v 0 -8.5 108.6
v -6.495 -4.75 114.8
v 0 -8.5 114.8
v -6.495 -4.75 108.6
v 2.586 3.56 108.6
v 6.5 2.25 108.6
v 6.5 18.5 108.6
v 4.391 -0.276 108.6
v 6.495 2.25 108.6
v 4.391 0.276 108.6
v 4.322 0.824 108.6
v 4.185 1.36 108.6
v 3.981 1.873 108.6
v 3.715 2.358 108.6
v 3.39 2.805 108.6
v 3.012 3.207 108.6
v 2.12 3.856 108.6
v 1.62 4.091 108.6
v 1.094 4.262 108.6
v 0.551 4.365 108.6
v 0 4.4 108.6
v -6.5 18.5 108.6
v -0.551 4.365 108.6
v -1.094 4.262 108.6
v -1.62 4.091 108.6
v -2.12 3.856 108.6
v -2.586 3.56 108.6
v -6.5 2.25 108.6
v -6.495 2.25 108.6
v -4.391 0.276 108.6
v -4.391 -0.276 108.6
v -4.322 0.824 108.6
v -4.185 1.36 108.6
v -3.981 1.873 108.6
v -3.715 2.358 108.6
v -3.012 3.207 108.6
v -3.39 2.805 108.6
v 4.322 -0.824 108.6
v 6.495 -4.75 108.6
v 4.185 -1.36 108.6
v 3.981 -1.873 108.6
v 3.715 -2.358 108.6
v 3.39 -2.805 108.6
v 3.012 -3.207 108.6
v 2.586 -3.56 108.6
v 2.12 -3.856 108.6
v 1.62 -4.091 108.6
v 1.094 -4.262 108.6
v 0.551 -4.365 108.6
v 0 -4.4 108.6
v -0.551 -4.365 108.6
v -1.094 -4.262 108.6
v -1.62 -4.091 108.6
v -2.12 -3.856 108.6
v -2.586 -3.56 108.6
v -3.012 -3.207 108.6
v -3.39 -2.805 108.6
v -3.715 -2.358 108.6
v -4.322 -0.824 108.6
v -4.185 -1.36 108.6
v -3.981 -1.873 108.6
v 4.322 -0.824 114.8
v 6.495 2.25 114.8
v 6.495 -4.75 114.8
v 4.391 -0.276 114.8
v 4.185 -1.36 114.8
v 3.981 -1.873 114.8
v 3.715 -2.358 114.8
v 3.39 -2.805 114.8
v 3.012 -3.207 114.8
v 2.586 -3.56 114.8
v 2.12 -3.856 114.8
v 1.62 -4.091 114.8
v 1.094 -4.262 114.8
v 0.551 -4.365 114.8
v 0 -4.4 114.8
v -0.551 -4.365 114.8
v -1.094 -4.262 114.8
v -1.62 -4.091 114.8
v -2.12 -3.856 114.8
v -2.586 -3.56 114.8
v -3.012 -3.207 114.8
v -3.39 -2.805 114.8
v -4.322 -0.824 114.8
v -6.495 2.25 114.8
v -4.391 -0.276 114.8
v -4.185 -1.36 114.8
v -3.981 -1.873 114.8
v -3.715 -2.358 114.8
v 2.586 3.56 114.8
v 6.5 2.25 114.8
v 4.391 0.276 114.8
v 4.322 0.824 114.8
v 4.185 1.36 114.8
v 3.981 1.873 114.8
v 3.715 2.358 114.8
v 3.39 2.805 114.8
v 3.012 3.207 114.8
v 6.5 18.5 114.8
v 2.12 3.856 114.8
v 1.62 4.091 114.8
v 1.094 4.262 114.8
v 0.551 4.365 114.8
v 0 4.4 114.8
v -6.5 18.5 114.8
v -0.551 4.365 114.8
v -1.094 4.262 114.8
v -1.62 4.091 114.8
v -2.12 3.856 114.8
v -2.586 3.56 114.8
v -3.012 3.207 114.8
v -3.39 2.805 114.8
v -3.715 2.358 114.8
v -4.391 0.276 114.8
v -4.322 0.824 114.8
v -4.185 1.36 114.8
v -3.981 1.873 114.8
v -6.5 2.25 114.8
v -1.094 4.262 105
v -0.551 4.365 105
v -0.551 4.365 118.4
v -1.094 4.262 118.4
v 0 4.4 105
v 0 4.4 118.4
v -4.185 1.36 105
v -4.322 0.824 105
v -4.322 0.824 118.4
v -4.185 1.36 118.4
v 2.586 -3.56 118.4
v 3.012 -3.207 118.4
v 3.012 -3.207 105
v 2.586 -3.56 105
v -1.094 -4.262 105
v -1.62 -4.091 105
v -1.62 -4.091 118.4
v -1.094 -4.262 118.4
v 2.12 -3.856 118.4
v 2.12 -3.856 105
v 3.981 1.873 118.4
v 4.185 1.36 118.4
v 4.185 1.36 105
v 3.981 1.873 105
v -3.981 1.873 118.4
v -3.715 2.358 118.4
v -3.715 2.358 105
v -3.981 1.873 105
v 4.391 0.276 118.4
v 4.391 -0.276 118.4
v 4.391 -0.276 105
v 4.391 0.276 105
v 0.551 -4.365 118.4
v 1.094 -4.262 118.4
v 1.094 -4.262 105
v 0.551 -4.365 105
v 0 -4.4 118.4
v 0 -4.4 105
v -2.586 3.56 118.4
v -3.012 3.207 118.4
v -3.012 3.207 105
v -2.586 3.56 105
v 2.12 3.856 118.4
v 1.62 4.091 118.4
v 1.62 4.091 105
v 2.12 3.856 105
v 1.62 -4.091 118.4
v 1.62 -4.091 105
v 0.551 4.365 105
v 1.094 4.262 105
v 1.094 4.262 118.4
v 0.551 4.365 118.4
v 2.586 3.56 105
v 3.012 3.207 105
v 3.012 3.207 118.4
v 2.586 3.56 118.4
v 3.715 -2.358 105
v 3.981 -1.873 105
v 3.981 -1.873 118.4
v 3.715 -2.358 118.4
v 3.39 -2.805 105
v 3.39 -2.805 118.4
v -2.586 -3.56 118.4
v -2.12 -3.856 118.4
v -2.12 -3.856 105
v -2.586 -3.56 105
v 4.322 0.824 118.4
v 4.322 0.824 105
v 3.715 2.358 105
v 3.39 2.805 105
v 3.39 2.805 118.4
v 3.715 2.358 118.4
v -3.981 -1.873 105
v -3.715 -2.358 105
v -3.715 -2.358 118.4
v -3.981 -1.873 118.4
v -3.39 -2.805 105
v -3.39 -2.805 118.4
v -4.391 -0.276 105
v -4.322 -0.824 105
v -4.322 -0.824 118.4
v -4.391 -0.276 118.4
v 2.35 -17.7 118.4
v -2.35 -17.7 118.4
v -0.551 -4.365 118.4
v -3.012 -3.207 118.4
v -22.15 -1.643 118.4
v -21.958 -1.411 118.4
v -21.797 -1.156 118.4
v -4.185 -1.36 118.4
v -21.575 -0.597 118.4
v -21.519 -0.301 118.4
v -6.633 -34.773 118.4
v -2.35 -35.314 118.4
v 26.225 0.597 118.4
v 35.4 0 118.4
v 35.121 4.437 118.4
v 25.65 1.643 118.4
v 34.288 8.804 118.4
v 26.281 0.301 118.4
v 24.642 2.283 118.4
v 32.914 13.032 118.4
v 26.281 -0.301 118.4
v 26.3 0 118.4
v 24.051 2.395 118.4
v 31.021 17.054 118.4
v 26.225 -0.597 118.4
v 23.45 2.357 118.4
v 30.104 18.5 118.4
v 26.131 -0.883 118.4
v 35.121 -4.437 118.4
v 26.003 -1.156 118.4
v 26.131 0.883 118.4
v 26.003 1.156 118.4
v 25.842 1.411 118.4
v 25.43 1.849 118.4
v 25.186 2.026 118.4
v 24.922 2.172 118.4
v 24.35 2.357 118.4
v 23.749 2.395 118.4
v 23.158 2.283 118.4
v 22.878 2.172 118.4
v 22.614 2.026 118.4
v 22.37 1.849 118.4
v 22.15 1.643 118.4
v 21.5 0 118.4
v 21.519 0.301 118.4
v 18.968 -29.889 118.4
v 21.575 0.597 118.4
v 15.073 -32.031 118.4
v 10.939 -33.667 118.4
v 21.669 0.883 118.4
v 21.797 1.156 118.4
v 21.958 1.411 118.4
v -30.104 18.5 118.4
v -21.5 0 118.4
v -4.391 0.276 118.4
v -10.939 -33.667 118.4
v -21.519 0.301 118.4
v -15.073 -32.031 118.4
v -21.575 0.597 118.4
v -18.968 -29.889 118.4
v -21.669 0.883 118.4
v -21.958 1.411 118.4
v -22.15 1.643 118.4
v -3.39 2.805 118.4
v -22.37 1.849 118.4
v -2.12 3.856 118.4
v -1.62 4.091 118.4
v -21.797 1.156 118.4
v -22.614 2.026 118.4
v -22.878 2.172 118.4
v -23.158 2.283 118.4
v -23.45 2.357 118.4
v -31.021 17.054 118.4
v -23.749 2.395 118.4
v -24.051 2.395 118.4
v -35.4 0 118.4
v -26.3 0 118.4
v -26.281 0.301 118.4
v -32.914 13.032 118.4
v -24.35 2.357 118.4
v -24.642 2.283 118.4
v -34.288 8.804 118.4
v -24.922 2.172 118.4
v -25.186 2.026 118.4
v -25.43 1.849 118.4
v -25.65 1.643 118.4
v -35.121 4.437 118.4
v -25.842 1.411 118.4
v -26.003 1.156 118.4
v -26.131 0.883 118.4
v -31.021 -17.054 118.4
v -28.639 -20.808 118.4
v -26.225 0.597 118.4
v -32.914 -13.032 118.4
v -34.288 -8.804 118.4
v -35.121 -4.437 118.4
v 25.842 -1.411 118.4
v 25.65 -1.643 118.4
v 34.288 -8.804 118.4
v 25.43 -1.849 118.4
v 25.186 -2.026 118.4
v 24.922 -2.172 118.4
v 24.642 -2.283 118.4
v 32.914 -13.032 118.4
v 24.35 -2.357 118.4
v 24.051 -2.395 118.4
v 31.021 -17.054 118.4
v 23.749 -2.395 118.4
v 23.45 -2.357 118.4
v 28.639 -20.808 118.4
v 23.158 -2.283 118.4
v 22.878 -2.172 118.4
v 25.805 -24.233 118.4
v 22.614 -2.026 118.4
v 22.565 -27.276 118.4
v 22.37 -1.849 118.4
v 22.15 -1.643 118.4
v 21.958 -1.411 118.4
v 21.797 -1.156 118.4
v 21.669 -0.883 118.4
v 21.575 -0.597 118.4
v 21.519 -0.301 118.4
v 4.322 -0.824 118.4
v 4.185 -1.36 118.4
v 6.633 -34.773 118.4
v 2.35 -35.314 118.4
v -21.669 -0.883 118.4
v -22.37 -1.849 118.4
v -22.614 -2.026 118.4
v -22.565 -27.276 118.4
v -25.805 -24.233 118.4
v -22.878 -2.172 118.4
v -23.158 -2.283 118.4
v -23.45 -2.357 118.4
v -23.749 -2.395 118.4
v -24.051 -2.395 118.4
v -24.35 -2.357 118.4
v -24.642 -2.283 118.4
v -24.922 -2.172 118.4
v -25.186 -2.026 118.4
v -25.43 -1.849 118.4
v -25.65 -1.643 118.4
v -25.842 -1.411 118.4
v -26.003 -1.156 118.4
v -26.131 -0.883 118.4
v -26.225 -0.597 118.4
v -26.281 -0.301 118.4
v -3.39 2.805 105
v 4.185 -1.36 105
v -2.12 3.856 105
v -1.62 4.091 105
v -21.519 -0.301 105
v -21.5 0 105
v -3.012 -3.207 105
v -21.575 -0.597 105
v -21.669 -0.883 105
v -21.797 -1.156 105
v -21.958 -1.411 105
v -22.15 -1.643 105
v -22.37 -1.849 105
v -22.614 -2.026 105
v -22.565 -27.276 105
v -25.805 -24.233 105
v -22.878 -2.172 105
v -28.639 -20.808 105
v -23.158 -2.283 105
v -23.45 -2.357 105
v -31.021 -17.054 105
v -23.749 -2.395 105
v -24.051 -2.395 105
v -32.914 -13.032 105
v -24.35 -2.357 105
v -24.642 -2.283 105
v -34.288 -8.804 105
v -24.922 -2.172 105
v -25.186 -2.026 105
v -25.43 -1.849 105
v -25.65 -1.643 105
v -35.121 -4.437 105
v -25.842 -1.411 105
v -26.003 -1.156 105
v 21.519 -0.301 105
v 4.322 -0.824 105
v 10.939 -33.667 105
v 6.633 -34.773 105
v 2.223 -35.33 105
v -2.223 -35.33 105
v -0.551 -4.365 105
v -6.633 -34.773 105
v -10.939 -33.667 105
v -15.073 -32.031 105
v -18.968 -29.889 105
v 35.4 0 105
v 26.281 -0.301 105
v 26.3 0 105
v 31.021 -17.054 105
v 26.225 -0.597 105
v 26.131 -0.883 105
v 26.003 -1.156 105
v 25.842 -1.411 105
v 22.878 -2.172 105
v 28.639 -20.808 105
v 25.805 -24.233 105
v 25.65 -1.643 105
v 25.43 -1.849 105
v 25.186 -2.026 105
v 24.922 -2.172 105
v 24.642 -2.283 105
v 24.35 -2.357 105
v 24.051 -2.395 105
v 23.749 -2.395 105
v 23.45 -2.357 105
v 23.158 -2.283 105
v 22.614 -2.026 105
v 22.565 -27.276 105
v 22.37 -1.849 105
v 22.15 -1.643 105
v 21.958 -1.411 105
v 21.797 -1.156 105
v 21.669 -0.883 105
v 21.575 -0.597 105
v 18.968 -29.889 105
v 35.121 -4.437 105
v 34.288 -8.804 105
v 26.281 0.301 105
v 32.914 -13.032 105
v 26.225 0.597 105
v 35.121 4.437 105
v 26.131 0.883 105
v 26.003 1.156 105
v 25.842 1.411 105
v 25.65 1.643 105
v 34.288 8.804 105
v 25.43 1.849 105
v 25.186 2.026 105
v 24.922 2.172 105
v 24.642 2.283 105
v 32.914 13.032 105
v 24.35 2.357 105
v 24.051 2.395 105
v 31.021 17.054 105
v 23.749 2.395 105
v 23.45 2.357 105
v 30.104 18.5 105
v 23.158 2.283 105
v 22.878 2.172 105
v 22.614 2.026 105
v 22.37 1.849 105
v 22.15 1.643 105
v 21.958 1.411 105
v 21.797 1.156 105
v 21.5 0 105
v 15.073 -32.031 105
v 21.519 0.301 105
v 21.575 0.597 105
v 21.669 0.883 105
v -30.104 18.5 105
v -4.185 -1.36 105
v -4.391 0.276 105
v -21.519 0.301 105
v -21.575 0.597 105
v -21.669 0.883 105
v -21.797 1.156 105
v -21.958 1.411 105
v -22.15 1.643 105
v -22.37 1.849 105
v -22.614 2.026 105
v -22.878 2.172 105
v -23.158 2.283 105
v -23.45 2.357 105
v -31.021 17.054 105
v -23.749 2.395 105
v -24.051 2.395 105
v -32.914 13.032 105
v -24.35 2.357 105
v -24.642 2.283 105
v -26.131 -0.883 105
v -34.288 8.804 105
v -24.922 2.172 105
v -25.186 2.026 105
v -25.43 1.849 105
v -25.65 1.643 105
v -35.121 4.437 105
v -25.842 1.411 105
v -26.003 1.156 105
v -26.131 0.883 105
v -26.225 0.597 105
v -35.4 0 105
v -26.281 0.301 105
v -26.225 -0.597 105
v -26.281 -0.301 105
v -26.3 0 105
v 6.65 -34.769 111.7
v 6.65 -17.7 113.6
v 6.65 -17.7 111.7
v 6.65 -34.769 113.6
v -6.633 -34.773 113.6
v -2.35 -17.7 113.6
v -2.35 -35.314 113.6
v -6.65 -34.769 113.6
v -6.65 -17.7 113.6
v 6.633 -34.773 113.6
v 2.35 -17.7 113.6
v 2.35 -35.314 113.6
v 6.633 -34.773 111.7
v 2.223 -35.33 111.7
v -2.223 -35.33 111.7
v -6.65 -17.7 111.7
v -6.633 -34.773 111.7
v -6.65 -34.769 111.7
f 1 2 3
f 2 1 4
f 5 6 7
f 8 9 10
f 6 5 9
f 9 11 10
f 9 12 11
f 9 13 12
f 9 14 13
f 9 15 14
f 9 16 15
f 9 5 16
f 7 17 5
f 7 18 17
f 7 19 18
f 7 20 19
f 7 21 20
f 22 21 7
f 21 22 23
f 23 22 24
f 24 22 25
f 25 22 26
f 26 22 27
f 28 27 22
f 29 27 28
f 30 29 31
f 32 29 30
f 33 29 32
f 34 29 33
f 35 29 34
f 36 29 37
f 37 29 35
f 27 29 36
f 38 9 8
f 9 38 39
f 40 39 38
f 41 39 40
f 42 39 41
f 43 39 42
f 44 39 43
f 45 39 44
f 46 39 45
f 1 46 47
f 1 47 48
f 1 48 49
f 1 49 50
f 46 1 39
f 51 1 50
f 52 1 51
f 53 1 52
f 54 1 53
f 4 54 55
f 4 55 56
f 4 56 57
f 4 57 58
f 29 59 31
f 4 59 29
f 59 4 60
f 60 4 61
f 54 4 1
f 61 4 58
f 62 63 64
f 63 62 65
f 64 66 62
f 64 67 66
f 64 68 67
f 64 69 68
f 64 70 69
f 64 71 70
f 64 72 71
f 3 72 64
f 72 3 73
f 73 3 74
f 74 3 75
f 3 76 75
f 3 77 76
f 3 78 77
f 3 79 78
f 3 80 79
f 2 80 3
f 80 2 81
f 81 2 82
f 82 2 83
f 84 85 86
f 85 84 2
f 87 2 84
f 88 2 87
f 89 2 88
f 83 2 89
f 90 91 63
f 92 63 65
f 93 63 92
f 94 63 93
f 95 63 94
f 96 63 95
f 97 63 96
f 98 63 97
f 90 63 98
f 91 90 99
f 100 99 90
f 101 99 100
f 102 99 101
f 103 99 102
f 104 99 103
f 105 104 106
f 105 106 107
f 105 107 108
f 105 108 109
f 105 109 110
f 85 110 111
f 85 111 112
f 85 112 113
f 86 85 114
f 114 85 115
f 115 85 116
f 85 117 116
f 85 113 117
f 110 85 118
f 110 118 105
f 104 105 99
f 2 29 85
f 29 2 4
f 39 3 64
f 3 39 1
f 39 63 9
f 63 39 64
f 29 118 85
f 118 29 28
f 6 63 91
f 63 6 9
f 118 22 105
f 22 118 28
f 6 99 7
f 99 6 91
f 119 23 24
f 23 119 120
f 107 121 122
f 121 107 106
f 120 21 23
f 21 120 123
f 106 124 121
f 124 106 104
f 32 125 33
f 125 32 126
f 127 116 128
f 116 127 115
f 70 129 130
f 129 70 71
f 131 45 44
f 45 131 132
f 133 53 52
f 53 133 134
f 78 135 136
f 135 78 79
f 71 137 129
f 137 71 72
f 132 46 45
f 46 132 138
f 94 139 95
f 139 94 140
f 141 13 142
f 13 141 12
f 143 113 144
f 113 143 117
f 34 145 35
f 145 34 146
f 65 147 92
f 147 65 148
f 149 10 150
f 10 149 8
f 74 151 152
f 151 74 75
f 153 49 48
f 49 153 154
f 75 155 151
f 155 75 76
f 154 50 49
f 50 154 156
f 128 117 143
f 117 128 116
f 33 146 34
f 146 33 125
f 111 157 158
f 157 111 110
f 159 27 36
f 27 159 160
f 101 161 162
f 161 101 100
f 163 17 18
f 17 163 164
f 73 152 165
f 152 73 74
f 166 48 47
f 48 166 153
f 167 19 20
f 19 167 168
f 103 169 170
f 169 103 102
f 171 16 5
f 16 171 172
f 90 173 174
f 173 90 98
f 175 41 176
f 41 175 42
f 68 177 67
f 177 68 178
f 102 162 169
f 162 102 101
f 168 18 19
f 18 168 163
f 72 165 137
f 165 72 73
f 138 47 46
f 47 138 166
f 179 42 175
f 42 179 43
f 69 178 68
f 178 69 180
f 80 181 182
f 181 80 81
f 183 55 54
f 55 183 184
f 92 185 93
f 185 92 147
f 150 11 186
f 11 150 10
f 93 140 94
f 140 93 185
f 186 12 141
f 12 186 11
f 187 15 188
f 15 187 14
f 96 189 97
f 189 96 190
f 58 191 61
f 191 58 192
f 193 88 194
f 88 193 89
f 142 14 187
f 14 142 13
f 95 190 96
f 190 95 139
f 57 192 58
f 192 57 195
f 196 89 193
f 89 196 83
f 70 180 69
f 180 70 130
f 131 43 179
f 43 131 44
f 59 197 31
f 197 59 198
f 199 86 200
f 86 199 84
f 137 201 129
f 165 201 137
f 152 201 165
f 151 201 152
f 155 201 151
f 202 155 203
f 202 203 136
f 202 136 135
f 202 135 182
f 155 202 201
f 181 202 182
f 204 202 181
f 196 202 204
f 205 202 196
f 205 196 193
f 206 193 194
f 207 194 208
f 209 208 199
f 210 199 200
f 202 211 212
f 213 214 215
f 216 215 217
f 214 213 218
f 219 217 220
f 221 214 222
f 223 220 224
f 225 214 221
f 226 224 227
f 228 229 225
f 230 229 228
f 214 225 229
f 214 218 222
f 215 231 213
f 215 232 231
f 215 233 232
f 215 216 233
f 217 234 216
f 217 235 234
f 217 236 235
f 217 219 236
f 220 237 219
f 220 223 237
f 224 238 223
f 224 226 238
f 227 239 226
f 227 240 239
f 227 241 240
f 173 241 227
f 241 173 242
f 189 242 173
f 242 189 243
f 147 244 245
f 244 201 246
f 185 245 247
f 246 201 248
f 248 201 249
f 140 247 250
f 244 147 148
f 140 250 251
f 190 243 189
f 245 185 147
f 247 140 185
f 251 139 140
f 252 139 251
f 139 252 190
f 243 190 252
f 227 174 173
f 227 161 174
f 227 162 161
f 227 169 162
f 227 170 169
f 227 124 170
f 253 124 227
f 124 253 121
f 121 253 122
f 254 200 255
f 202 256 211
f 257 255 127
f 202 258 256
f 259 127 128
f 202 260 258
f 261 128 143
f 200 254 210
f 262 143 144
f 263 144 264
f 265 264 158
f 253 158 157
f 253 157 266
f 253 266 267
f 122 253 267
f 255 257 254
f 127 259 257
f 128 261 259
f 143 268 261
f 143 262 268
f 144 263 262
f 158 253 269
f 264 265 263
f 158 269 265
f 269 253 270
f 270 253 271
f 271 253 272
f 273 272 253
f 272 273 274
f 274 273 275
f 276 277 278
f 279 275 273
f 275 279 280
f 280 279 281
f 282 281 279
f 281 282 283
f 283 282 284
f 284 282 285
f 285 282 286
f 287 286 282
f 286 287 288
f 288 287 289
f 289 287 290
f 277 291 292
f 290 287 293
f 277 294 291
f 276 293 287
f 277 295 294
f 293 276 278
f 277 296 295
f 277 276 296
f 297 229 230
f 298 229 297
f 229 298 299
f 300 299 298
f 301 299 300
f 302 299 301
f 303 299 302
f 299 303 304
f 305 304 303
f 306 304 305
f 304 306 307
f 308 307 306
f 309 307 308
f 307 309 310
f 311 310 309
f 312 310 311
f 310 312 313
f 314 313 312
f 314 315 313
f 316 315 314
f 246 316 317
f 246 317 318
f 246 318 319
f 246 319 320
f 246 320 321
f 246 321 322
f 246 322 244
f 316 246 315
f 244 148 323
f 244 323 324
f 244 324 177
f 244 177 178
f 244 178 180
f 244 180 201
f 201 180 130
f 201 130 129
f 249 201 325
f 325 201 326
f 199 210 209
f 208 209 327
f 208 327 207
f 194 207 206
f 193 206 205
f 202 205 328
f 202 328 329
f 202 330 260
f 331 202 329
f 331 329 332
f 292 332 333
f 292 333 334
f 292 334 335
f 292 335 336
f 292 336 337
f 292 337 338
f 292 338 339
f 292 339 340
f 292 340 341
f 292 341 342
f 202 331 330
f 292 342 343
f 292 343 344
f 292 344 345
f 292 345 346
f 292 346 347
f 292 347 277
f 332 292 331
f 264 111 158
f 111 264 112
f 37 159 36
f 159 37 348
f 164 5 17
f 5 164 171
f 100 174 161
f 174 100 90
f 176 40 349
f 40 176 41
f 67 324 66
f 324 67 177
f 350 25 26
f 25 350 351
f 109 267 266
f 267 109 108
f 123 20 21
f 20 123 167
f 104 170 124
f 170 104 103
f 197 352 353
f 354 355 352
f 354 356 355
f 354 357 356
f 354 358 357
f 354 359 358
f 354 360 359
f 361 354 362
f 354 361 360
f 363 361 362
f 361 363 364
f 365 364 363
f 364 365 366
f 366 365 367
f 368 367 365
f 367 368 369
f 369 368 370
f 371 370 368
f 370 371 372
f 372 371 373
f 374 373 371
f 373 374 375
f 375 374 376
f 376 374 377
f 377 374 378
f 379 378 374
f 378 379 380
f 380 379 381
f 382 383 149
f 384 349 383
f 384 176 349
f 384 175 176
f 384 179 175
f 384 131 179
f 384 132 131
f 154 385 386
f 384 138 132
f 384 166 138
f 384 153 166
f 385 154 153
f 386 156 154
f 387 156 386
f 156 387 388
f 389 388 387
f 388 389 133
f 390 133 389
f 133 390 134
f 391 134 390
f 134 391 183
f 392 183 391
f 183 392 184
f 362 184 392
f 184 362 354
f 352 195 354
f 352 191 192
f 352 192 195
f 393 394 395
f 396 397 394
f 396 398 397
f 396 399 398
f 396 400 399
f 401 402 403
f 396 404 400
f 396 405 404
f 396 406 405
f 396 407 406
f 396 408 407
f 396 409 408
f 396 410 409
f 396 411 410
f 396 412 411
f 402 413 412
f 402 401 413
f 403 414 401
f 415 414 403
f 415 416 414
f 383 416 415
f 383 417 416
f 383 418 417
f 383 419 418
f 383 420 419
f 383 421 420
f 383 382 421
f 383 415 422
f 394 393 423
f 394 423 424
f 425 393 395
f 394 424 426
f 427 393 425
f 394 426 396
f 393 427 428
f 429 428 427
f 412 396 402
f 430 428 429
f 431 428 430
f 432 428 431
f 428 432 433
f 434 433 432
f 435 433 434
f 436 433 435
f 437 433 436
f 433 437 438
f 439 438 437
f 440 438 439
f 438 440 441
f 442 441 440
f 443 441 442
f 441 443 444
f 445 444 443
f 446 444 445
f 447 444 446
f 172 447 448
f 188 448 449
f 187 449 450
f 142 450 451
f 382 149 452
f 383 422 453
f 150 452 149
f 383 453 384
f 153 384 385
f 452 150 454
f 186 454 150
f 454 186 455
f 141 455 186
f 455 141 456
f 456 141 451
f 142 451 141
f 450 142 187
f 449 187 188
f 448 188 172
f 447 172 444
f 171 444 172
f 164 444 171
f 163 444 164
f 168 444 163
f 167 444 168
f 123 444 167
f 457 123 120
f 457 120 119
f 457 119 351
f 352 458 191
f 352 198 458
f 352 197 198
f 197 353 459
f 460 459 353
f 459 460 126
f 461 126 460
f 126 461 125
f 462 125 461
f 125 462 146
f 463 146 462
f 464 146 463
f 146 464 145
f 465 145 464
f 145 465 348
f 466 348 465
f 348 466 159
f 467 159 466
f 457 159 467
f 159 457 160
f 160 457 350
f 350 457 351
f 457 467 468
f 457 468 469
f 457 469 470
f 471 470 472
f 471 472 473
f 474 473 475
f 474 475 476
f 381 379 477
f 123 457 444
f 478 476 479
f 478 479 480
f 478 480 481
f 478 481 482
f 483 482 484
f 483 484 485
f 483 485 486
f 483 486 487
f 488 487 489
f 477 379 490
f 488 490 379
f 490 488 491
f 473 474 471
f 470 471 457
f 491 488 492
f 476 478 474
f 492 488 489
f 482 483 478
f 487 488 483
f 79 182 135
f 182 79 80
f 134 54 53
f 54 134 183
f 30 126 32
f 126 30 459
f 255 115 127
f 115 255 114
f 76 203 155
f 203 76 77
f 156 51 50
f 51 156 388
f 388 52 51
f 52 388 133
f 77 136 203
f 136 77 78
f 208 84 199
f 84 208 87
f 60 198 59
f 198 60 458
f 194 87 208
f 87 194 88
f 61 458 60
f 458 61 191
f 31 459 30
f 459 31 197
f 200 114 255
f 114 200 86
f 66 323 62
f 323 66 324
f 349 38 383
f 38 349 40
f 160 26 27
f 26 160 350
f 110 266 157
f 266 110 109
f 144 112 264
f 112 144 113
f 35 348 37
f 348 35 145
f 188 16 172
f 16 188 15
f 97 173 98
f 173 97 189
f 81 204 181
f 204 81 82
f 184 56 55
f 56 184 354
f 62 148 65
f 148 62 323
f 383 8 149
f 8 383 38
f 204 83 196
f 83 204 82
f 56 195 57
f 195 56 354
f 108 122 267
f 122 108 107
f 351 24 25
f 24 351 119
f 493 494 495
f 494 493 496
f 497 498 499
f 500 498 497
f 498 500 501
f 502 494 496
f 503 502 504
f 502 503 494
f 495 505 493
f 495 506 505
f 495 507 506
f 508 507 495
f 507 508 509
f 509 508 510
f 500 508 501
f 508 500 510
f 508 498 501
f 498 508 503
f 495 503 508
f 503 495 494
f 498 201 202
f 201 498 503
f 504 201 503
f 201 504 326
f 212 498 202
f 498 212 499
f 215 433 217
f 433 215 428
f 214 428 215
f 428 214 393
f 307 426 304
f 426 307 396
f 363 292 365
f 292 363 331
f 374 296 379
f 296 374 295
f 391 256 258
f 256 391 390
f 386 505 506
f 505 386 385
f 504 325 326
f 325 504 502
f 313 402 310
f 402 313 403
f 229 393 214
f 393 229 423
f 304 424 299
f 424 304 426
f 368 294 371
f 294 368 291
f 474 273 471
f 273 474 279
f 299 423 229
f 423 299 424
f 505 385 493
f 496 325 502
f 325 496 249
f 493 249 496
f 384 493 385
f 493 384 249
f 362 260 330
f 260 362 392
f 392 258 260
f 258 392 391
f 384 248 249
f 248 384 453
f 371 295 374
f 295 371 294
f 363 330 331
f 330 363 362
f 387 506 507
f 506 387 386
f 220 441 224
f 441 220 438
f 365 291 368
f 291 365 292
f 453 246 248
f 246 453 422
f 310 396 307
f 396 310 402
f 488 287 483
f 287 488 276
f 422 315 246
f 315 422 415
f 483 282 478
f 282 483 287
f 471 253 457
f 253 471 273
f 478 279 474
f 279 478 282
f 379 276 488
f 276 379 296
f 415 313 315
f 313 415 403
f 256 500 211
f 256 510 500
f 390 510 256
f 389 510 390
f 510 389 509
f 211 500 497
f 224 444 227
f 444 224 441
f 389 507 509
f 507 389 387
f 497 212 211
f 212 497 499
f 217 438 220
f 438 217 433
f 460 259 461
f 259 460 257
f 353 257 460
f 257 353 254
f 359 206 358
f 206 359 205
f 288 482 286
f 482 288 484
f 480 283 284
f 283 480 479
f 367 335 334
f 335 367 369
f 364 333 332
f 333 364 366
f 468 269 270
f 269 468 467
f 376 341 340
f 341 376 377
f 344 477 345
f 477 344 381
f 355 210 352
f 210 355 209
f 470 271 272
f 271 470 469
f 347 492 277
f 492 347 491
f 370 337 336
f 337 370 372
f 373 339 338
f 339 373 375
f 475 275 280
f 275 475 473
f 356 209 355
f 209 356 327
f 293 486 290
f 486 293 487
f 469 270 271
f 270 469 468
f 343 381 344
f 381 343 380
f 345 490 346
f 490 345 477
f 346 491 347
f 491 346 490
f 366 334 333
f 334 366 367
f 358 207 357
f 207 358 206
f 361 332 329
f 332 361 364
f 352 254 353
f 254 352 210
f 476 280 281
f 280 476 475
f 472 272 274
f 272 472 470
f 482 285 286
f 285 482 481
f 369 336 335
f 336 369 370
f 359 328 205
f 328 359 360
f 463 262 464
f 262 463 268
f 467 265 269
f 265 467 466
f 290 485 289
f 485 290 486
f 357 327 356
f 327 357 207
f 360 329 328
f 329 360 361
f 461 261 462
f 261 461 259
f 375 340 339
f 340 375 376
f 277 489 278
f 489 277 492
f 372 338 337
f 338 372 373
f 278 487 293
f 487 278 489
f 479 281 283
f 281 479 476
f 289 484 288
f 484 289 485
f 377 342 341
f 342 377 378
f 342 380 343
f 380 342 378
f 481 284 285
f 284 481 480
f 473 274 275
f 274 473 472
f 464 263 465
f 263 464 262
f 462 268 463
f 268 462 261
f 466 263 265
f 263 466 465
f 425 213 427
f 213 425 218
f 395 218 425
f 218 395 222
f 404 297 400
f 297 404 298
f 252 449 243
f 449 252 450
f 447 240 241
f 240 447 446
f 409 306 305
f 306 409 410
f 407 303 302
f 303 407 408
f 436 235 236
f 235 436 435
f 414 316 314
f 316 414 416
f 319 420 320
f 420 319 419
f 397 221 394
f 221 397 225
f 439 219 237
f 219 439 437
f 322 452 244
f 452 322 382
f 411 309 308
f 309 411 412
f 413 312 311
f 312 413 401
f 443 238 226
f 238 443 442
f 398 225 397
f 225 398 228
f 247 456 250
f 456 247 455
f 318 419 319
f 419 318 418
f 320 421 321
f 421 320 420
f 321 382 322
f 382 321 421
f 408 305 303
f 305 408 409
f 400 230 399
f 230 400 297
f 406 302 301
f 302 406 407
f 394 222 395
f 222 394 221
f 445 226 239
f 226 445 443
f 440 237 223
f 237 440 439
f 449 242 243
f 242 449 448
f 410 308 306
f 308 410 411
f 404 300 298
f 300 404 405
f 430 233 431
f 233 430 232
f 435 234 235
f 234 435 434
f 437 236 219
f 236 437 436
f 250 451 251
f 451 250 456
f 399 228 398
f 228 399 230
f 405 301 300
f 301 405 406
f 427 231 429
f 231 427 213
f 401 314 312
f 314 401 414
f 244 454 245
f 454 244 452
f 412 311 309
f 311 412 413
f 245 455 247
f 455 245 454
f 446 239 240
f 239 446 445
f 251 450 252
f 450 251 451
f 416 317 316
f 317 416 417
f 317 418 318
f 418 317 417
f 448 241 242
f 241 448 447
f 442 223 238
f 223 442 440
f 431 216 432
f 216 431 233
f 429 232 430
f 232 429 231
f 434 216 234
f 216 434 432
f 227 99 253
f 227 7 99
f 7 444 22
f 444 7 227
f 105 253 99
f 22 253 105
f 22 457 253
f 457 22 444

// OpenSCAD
$fn=50;

//syringe
syringe_front_radius= 14.8;
syringe_front_length = 6.3;

syringe_rear_length = 5.4;
syringe_rear_radius = 14.4;

//from middle part
syringe_middle_length = 105;
syringe_middle_radius = 11.5;

shaft_length = 10;
shaft_radius = 2.1;


nut_lenght = 6.2;
nut_side_to_side = 13;

berring_radius = 7.5;
spacing = 2;

rod_distance = berring_radius+spacing+syringe_rear_radius;
extruder_middle_radius = syringe_rear_radius + berring_radius*2 + spacing*6/2;
extruder_middle_length = syringe_rear_length+ spacing*4;

//axis shaft
threaded_rod_radius = 4.4;
syringe_nozzle_length = 20;
syringe_nozzle_radius = 2.5;

//motor ho
motor_holder_length = 5;
//motor
motor_s_radius = 11.5;
motor_s_length = 2;
motor_shaft_radius = 2.6;
motor_screw_radius = 1.5;
from_motor_center_to_screw = 15;

add_a_little_space = 0.3;

//where to press on syringe
syringe_piston_top_radius = 12.7/2+ add_a_little_space;
syringe_piston_top_length = 1.6 +add_a_little_space;

syringe_piston_rod_length = 100; //no need to be exact
syringe_piston_rod_radius = 4.1/2+add_a_little_space;

module circle_extrude(length, radius){
    linear_extrude(length){
        circle(r = radius);
    }
}
module front_part(){
    //Front part
    difference(){
        linear_extrude(extruder_middle_length){
            circle(r = extruder_middle_radius);
        }
        // shaft1
        translate([-rod_distance,0,0]){
            circle_extrude(shaft_length,shaft_radius);
        }

        // shaft2
        translate([rod_distance,0,0]){
            circle_extrude(shaft_length,shaft_radius);
        }
           
        //syringe_front
        translate([0,-(syringe_front_radius+spacing+threaded_rod_radius), (shaft_length-syringe_front_length)/2]){
            circle_extrude(syringe_front_length, syringe_front_radius);
            translate([-syringe_front_radius,-syringe_front_radius*15,0]){
                cube([syringe_front_radius*2,syringe_front_radius*15,syringe_front_length]);
            }
            rotate([180,0,0]){
                //nozzle
                translate([0,0,-0.1]){
                circle_extrude(syringe_nozzle_length+0.2, syringe_nozzle_radius);    
                
                //cuts to insert nozzle
                translate([-syringe_nozzle_radius,0,0]){
                    cube([syringe_nozzle_radius*2,syringe_nozzle_radius*15,syringe_nozzle_length]);
                }
                }
            }
            //syringe body
            circle_extrude(syringe_middle_length, syringe_middle_radius);  
            translate([-syringe_middle_radius,-syringe_middle_radius*15,0]){  
                cube([syringe_middle_radius*2,syringe_middle_radius*15,syringe_middle_length]);
            }
        }
        
        //threaded_rod
        circle_extrude(shaft_length, threaded_rod_radius);
        
        //cut in bottom
         translate([-extruder_middle_radius,berring_radius+spacing,0]){
                cube([extruder_middle_radius*2,extruder_middle_radius*2,extruder_middle_length]);
            }
    }
}

module moror_part()
{
    //motor coupling part
    translate([0,0,200]){
        difference(){
            linear_extrude(motor_holder_length){
                circle(r = extruder_middle_radius);
            }    
            // shaft1
            translate([-rod_distance,0,0]){
                circle_extrude(shaft_length,shaft_radius);
            }

            // shaft2
            translate([rod_distance,0,0]){
                circle_extrude(shaft_length,shaft_radius);
            }
            //motor 
            circle_extrude(motor_s_length, motor_s_radius);
            circle_extrude(shaft_length, motor_shaft_radius);
            
            //motor holder
            translate([from_motor_center_to_screw, from_motor_center_to_screw, 0]){
                circle_extrude(shaft_length, motor_screw_radius);
            }
            translate([-from_motor_center_to_screw,from_motor_center_to_screw,0]){
                circle_extrude(shaft_length, motor_screw_radius);
            }
            translate([-from_motor_center_to_screw,-from_motor_center_to_screw,0]){
                circle_extrude(shaft_length, motor_screw_radius);
            }
             translate([from_motor_center_to_screw,-from_motor_center_to_screw,0]){
                circle_extrude(shaft_length, motor_screw_radius);
            }        
            
            //cut in bottom
            translate([-extruder_middle_radius,from_motor_center_to_screw+motor_screw_radius+spacing,0]){
                cube([extruder_middle_radius*2,extruder_middle_radius*2,extruder_middle_length]);
            }
        }
    }
}


module syringe()
{
    //front
    circle_extrude(syringe_front_length, syringe_front_radius);
    //middle
    circle_extrude(syringe_middle_length, syringe_middle_radius);
    //rear
    translate([0,0,syringe_middle_length-syringe_rear_length]){
        circle_extrude(syringe_rear_length, syringe_rear_radius);
    }        
}
module extruder_middle(){
    
    //part itself
    difference(){
        linear_extrude(extruder_middle_length){
            circle(r = extruder_middle_radius);
        }
        
        // shaft1
        translate([-rod_distance, 0, 0]){
            circle_extrude(extruder_middle_length,shaft_radius + add_a_little_space);
        }

        // shaft2
        translate([rod_distance, 0, 0]){
            circle_extrude(extruder_middle_length, shaft_radius + add_a_little_space);
        }
        
       //hex cut
        rotate([0,0,90]){
            translate([-1,0,(extruder_middle_length-nut_lenght)/2]){
                linear_extrude(nut_lenght){
                    circle(d=15, $fn=6);             
                }
                translate([nut_side_to_side/4,-nut_side_to_side/2, 0]){
                    cube([25,nut_side_to_side,nut_lenght]);
                }
            }
             //threaded_rod
        circle_extrude(extruder_middle_length, threaded_rod_radius);
        }
        
        //cut for piston
        translate([0,-extruder_middle_radius/2,extruder_middle_length/2]){
            syringe_piston();
        }
        
         //cut in bottom
            translate([-extruder_middle_radius,from_motor_center_to_screw+motor_screw_radius+spacing,0]){
                cube([extruder_middle_radius*2,extruder_middle_radius*2,extruder_middle_length]);
            }
    }
    
}
module syringe_piston(){
    linear_extrude(syringe_piston_top_length, syringe_piston_top_radius);    
    linear_extrude(syringe_piston_rod_length, syringe_piston_rod_radius);
    
    //cuts to insert syringe rod
    translate([-syringe_piston_top_radius,-syringe_piston_top_radius*5,0]){
        cube([syringe_piston_top_radius*2,syringe_piston_top_radius*5,syringe_piston_top_length]);
    }
    
    translate([-syringe_piston_rod_radius,-syringe_piston_rod_radius*15,0]){
        cube([syringe_piston_rod_radius*2,syringe_piston_rod_radius*15,syringe_piston_rod_length]);
    }
}

//front_part();
//moror_part();
translate([0,-(syringe_front_radius+spacing+threaded_rod_radius), (shaft_length-syringe_front_length)/2]){
//    syringe();    
}
translate([0,0, syringe_middle_length]){
    extruder_middle();
}
